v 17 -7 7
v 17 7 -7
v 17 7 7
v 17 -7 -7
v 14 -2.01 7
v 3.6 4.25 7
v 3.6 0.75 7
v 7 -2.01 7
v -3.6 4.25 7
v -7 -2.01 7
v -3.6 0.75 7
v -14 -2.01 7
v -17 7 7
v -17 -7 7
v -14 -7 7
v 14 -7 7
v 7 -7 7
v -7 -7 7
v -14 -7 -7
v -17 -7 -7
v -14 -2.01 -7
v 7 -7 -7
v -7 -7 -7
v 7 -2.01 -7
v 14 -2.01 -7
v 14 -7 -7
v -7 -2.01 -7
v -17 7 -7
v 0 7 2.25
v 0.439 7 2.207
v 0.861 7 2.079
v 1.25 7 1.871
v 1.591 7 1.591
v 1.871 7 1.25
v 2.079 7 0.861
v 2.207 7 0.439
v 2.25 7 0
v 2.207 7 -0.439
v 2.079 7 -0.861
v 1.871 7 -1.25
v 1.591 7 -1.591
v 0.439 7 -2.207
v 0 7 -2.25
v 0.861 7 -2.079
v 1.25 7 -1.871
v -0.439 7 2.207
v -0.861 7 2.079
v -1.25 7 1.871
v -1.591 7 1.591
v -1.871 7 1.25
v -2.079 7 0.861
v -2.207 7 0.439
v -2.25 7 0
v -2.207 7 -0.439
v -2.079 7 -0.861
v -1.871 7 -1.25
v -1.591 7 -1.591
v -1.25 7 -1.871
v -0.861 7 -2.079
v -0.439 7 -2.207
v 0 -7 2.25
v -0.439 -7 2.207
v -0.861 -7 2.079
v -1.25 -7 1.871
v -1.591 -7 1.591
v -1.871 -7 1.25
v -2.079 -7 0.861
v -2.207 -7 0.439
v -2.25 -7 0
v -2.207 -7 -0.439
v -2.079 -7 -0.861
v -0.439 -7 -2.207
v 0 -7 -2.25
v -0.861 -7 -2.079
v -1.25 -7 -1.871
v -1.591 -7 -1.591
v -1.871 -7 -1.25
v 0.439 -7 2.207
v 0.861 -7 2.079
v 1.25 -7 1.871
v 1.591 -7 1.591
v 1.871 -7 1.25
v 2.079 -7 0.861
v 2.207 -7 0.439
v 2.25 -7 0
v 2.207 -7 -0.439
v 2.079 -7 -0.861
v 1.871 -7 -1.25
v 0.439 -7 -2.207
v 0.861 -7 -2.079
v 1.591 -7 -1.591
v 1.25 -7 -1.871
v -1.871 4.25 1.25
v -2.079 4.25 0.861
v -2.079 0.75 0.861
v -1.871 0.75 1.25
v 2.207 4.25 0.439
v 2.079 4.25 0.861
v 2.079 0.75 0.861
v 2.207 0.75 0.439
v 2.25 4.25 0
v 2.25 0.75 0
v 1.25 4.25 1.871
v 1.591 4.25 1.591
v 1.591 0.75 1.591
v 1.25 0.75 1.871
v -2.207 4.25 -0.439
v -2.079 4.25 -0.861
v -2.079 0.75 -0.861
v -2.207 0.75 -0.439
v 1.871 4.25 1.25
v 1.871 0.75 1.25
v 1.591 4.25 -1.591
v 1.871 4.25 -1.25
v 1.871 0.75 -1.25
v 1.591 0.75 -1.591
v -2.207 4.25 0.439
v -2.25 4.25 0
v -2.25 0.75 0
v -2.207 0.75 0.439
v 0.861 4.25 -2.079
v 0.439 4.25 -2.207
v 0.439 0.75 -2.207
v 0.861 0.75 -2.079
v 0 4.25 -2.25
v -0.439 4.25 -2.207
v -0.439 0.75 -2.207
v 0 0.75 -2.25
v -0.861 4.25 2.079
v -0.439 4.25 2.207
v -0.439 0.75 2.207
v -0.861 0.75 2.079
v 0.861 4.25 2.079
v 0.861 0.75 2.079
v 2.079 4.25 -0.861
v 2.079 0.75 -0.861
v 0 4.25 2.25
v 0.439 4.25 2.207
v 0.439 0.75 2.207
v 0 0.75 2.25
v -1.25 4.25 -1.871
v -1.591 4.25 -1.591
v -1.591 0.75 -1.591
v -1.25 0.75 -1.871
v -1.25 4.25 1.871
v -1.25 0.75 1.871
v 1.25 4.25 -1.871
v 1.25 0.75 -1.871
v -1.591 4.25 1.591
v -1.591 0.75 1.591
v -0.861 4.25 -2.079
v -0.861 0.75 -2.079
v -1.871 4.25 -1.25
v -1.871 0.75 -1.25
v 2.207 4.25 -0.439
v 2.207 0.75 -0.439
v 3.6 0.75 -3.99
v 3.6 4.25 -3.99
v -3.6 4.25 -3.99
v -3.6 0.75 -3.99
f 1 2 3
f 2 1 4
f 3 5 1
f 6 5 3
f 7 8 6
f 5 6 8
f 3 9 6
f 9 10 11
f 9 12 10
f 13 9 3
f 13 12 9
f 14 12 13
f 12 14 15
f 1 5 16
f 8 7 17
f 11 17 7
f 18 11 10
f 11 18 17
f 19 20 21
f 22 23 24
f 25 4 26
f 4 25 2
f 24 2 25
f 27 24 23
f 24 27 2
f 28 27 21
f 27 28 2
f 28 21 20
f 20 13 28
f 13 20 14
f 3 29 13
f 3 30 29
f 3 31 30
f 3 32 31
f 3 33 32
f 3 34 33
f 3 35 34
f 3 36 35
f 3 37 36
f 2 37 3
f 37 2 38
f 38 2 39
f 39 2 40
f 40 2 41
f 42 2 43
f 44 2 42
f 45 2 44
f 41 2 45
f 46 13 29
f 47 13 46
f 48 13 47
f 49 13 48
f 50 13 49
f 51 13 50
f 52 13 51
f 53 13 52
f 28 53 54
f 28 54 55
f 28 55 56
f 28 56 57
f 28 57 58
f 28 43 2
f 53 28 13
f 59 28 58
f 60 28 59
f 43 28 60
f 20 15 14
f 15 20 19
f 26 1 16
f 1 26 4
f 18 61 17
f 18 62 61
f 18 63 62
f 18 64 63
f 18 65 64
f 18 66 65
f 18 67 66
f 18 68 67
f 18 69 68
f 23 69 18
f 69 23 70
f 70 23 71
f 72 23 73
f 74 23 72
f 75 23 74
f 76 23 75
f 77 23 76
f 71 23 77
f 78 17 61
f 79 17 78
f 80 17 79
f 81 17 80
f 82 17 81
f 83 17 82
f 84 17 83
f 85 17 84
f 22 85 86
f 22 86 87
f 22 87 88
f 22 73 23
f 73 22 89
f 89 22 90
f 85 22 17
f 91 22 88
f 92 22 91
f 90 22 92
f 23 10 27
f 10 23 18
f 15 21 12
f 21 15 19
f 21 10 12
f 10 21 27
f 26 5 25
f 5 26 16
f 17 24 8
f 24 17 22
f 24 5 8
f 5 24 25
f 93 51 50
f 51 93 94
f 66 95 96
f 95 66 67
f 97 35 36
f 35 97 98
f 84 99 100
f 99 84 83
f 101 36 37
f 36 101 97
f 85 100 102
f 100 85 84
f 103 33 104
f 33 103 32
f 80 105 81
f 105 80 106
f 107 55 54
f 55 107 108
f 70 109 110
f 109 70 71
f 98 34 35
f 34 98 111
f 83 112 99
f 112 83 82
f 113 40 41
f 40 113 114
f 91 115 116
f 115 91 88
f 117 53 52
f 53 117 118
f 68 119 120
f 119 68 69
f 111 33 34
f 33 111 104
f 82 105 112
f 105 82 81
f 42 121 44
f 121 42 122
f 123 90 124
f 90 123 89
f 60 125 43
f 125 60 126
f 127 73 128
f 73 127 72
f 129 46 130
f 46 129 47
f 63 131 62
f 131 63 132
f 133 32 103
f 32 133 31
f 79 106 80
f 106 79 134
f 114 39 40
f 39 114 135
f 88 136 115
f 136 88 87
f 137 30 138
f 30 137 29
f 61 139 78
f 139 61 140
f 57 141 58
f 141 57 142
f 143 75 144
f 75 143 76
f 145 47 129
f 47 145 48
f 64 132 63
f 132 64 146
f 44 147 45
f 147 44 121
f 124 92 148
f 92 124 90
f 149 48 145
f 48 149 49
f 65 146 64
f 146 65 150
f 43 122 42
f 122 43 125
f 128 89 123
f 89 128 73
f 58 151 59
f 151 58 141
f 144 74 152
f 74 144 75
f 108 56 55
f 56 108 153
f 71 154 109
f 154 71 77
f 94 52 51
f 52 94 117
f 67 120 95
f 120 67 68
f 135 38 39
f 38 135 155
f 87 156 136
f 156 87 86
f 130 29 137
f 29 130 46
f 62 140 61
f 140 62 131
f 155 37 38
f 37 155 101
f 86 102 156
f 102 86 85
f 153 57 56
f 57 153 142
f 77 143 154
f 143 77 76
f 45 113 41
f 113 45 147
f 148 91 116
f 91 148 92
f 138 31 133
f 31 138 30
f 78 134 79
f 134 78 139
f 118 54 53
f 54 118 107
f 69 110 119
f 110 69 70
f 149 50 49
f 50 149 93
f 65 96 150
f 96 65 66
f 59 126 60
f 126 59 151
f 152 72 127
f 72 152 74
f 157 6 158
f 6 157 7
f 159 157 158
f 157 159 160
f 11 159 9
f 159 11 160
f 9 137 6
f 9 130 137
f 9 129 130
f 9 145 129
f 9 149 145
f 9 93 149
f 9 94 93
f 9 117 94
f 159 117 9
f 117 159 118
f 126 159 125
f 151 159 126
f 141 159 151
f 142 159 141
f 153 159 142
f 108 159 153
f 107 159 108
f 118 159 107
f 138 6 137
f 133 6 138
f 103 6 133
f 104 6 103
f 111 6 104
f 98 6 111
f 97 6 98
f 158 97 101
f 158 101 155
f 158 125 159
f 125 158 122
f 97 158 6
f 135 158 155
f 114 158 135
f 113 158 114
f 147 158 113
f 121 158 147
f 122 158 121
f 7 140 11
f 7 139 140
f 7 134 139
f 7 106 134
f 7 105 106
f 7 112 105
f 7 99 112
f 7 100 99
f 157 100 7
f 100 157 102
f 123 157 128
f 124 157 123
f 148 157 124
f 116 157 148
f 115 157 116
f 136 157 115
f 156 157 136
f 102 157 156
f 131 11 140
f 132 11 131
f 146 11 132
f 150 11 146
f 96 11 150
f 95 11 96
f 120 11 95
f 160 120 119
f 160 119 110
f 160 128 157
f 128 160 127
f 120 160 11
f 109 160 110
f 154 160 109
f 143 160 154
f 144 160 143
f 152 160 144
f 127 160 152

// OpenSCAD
$fn=32;
EPS=0.01;

RScrewHole=4.5/2;

difference(5) {
    cube(size=[34,14,14], center=true);

    translate([-10.5,-4.5-EPS,0])
        cube(size=[7,5,15], center=true);
    translate([10.5,-4.5-EPS,0])
        cube(size=[7,5,15], center=true);

    rotate(90, [1,0,0])
        cylinder(r=RScrewHole, h=15, center=true);

    translate([0,2.5,1.5+EPS])
        cube(size=[7.2,3.5,14/2+4], center=true);
}
